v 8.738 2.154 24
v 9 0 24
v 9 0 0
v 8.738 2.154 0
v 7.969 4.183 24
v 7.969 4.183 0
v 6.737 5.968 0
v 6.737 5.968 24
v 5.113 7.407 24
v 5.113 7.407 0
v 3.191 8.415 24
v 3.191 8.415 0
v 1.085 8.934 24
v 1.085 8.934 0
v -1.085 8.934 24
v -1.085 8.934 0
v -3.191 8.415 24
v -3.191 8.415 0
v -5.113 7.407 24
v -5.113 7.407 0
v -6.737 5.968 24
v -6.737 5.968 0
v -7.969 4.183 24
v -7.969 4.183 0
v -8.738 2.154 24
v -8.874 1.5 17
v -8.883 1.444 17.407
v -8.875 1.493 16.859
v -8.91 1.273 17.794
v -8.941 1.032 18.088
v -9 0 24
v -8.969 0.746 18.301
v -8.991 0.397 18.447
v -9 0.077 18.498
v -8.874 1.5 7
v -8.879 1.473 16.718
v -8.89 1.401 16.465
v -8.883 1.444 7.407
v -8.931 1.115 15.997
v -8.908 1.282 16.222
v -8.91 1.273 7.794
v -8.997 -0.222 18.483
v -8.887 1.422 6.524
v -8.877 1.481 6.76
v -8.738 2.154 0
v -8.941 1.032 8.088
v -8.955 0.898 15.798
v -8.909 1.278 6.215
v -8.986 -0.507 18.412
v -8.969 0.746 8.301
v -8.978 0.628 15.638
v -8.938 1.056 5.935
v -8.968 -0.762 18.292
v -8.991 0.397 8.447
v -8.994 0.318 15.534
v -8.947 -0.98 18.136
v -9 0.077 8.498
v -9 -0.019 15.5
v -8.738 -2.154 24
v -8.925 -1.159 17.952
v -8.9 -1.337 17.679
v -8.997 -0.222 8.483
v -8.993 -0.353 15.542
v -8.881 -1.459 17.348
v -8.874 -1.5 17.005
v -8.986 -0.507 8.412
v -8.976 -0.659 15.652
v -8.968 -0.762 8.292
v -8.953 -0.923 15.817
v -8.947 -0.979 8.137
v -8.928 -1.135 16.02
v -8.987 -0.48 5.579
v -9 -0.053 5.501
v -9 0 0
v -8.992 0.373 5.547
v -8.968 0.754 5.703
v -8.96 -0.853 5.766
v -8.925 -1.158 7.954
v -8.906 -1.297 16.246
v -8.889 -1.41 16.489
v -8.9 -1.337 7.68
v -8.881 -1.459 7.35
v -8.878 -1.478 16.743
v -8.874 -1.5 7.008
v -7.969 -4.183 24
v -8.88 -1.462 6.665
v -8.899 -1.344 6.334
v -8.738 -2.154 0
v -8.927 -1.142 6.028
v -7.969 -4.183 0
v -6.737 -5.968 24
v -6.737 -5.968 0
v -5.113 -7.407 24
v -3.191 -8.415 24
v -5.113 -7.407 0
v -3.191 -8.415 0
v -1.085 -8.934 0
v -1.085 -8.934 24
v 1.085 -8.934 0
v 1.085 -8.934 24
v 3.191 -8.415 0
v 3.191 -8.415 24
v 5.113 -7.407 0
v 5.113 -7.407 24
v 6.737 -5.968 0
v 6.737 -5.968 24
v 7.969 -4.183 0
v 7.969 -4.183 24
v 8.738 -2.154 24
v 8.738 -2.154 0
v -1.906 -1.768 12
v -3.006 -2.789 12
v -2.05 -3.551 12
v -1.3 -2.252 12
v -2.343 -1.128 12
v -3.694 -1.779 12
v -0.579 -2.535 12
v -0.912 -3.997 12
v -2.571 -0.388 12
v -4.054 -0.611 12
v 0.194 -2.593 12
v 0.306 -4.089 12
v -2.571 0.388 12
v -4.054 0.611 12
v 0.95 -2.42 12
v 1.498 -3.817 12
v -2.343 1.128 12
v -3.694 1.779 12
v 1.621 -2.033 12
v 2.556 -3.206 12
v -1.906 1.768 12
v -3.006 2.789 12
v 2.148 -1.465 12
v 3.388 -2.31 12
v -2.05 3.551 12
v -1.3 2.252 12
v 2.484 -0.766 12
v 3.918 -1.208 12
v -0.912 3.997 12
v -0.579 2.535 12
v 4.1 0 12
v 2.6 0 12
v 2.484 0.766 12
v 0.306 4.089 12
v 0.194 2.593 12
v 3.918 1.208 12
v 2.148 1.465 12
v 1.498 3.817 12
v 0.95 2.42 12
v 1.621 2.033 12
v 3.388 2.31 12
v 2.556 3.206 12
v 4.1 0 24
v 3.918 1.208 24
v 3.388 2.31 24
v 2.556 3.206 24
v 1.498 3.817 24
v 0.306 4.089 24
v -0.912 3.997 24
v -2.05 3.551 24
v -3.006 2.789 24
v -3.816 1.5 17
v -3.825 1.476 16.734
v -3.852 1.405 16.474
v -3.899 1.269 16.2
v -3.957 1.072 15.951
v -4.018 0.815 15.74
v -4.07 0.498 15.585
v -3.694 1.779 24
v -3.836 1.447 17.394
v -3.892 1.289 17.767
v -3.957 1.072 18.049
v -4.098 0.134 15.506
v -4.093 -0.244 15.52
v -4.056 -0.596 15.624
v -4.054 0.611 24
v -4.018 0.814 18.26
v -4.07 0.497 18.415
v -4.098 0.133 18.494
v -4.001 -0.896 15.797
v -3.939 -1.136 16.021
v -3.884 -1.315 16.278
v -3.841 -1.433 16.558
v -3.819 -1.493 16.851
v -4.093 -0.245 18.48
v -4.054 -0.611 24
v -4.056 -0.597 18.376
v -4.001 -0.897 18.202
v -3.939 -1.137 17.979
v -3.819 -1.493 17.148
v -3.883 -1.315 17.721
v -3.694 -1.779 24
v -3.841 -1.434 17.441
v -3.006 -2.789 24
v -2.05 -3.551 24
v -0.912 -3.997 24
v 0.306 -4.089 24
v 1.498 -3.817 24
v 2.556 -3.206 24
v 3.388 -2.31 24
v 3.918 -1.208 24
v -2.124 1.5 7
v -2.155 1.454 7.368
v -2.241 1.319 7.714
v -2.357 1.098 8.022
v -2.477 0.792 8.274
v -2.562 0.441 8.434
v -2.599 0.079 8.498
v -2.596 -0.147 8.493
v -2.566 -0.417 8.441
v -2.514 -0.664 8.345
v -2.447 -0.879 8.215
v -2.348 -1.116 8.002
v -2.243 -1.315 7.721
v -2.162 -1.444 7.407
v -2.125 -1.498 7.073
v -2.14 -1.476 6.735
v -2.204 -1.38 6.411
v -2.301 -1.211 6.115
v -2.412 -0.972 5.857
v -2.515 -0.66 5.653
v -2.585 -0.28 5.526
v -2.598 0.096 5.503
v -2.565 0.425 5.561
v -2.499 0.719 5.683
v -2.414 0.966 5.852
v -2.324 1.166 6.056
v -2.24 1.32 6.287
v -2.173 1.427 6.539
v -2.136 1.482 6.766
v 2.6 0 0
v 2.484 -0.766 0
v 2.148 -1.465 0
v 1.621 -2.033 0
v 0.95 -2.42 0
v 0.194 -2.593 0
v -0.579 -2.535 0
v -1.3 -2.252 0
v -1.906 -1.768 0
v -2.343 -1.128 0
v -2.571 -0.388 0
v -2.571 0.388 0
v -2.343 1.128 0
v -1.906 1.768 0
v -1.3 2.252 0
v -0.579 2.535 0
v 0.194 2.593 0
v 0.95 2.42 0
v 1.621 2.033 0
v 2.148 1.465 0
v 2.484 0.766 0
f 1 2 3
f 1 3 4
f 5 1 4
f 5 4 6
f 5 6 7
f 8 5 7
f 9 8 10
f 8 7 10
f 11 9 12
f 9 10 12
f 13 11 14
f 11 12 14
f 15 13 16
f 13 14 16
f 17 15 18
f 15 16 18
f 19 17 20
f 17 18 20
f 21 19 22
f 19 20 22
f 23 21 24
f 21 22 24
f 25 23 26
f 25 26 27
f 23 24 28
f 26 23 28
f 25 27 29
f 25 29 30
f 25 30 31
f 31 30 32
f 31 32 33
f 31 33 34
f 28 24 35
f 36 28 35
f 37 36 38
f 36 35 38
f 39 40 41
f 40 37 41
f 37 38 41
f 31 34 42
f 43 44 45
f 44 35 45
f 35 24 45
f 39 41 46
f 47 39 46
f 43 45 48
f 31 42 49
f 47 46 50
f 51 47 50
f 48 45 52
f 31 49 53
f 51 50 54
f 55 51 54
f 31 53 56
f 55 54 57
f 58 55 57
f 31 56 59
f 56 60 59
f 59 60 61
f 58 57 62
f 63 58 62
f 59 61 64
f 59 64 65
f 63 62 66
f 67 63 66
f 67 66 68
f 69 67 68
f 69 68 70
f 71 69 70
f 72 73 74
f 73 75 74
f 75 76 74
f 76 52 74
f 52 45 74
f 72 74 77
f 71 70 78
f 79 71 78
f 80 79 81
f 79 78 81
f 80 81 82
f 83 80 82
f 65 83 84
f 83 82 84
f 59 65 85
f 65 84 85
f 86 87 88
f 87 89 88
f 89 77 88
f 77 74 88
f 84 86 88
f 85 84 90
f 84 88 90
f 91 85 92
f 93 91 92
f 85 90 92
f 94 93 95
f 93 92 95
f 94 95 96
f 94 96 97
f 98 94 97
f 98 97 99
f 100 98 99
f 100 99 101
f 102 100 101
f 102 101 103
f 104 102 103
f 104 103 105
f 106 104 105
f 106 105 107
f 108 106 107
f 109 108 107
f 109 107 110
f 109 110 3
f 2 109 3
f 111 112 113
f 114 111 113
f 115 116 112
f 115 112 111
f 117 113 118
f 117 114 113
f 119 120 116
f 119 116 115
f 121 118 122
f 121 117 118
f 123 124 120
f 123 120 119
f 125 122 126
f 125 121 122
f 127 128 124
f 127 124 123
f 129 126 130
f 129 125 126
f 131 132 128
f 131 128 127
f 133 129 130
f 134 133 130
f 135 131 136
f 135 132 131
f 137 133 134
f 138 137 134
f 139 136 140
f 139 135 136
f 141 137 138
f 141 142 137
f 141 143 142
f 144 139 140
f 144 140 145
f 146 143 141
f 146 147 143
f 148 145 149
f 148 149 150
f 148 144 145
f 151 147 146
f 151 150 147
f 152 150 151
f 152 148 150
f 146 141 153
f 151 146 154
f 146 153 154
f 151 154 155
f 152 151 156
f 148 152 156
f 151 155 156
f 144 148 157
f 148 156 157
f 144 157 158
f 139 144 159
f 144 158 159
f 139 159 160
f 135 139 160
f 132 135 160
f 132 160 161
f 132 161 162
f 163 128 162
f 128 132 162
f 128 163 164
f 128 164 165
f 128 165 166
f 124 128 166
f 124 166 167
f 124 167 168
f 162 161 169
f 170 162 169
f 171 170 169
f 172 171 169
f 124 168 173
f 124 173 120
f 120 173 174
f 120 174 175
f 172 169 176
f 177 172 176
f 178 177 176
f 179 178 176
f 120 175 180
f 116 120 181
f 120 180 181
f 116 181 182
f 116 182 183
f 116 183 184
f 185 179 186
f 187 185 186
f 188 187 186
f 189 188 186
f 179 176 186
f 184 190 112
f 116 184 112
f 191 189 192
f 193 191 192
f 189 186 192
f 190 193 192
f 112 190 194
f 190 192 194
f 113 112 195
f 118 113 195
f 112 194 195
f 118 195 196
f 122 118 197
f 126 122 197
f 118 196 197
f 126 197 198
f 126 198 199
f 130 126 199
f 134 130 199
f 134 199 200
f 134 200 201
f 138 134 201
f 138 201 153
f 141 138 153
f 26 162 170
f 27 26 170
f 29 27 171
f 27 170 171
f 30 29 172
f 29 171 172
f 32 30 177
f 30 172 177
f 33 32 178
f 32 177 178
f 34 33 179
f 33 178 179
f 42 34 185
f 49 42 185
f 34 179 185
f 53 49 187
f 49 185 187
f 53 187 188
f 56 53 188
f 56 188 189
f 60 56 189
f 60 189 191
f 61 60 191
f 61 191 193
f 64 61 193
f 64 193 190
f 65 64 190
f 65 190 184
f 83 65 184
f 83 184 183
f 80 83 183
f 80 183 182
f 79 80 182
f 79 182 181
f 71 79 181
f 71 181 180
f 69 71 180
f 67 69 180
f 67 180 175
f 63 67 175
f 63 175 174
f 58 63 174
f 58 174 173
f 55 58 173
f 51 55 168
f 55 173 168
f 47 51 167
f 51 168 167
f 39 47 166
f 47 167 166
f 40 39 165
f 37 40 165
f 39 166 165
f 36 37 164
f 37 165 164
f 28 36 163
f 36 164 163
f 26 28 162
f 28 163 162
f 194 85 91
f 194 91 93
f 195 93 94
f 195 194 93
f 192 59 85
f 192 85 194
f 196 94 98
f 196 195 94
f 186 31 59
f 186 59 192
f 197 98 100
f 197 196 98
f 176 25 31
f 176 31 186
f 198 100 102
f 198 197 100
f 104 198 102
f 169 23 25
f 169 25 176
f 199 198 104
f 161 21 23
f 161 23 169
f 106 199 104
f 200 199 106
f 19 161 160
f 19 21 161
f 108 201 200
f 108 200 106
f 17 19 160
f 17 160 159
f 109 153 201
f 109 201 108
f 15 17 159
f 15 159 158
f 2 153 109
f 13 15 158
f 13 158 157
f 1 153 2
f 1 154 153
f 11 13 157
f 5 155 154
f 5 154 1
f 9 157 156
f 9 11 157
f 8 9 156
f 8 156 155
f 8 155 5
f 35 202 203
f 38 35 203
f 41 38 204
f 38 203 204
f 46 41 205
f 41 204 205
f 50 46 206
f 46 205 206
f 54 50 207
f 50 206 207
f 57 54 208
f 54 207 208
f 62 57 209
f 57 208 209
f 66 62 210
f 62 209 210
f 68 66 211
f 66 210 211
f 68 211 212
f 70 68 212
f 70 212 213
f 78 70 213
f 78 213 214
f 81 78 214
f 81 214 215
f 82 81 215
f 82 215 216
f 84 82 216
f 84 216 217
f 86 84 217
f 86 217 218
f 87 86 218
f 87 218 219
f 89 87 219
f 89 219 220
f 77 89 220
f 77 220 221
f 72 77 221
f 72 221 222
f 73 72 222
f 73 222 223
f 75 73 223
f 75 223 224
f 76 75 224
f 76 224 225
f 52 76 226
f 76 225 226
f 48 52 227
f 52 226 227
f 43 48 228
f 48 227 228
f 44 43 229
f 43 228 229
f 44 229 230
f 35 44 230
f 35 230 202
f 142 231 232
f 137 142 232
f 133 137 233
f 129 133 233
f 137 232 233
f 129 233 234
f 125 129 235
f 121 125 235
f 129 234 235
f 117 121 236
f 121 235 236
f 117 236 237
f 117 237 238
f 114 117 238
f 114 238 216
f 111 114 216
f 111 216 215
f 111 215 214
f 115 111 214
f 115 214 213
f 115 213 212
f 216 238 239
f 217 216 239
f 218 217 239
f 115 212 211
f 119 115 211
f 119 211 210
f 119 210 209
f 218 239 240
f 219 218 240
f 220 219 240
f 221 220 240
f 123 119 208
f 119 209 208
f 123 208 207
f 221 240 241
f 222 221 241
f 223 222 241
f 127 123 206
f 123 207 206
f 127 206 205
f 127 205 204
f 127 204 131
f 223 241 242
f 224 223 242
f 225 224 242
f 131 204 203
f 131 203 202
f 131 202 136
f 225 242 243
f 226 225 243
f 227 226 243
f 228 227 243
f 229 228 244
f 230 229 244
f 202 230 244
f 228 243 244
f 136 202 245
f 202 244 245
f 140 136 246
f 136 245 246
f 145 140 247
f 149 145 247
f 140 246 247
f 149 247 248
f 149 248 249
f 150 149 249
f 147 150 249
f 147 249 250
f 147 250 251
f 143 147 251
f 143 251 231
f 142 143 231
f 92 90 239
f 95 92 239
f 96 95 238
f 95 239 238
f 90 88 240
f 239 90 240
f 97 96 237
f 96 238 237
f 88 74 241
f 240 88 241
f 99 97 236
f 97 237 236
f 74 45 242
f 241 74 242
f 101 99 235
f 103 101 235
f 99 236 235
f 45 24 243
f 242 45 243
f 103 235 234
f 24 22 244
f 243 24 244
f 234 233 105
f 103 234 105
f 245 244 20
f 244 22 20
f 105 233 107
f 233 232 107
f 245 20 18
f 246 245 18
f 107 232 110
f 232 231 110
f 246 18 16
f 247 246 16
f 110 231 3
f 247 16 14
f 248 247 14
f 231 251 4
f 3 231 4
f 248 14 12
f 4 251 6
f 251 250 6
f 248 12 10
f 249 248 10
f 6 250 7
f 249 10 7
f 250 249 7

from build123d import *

# Parameters (mm, degrees)
F0_R     = 9
F1_DEPTH = 24
F2_R     = 4.1
F3_DEPTH = 12
F4_R     = 2.6
F5_DEPTH = 25
F6_R     = 1.5
F7_DEPTH = 25


with BuildPart() as f1:
    # F0 (on Top) → F1 (new body)
    with BuildSketch(Plane.XY):
        Circle(F0_R)
    extrude(amount=F1_DEPTH)

    # F2 (on face) → F3 (cut)
    with BuildSketch(Plane.XY.offset(24)):
        Circle(F2_R)
    extrude(amount=-F3_DEPTH, mode=Mode.SUBTRACT)

    # F4 (on face) → F5 (cut)
    with BuildSketch(Plane(origin=(0, 0, 0), x_dir=(1, 0, 0), z_dir=(0, 0, -1))):
        Circle(F4_R)
    extrude(amount=-F5_DEPTH, mode=Mode.SUBTRACT)

    # F6 (on Right) → F7 (cut)
    with BuildSketch(Plane.YZ):
        with Locations((0, 17)):
            Circle(F6_R)
        with Locations((0, 7)):
            Circle(F6_R)
    extrude(amount=-F7_DEPTH, mode=Mode.SUBTRACT)


solid = f1.part
